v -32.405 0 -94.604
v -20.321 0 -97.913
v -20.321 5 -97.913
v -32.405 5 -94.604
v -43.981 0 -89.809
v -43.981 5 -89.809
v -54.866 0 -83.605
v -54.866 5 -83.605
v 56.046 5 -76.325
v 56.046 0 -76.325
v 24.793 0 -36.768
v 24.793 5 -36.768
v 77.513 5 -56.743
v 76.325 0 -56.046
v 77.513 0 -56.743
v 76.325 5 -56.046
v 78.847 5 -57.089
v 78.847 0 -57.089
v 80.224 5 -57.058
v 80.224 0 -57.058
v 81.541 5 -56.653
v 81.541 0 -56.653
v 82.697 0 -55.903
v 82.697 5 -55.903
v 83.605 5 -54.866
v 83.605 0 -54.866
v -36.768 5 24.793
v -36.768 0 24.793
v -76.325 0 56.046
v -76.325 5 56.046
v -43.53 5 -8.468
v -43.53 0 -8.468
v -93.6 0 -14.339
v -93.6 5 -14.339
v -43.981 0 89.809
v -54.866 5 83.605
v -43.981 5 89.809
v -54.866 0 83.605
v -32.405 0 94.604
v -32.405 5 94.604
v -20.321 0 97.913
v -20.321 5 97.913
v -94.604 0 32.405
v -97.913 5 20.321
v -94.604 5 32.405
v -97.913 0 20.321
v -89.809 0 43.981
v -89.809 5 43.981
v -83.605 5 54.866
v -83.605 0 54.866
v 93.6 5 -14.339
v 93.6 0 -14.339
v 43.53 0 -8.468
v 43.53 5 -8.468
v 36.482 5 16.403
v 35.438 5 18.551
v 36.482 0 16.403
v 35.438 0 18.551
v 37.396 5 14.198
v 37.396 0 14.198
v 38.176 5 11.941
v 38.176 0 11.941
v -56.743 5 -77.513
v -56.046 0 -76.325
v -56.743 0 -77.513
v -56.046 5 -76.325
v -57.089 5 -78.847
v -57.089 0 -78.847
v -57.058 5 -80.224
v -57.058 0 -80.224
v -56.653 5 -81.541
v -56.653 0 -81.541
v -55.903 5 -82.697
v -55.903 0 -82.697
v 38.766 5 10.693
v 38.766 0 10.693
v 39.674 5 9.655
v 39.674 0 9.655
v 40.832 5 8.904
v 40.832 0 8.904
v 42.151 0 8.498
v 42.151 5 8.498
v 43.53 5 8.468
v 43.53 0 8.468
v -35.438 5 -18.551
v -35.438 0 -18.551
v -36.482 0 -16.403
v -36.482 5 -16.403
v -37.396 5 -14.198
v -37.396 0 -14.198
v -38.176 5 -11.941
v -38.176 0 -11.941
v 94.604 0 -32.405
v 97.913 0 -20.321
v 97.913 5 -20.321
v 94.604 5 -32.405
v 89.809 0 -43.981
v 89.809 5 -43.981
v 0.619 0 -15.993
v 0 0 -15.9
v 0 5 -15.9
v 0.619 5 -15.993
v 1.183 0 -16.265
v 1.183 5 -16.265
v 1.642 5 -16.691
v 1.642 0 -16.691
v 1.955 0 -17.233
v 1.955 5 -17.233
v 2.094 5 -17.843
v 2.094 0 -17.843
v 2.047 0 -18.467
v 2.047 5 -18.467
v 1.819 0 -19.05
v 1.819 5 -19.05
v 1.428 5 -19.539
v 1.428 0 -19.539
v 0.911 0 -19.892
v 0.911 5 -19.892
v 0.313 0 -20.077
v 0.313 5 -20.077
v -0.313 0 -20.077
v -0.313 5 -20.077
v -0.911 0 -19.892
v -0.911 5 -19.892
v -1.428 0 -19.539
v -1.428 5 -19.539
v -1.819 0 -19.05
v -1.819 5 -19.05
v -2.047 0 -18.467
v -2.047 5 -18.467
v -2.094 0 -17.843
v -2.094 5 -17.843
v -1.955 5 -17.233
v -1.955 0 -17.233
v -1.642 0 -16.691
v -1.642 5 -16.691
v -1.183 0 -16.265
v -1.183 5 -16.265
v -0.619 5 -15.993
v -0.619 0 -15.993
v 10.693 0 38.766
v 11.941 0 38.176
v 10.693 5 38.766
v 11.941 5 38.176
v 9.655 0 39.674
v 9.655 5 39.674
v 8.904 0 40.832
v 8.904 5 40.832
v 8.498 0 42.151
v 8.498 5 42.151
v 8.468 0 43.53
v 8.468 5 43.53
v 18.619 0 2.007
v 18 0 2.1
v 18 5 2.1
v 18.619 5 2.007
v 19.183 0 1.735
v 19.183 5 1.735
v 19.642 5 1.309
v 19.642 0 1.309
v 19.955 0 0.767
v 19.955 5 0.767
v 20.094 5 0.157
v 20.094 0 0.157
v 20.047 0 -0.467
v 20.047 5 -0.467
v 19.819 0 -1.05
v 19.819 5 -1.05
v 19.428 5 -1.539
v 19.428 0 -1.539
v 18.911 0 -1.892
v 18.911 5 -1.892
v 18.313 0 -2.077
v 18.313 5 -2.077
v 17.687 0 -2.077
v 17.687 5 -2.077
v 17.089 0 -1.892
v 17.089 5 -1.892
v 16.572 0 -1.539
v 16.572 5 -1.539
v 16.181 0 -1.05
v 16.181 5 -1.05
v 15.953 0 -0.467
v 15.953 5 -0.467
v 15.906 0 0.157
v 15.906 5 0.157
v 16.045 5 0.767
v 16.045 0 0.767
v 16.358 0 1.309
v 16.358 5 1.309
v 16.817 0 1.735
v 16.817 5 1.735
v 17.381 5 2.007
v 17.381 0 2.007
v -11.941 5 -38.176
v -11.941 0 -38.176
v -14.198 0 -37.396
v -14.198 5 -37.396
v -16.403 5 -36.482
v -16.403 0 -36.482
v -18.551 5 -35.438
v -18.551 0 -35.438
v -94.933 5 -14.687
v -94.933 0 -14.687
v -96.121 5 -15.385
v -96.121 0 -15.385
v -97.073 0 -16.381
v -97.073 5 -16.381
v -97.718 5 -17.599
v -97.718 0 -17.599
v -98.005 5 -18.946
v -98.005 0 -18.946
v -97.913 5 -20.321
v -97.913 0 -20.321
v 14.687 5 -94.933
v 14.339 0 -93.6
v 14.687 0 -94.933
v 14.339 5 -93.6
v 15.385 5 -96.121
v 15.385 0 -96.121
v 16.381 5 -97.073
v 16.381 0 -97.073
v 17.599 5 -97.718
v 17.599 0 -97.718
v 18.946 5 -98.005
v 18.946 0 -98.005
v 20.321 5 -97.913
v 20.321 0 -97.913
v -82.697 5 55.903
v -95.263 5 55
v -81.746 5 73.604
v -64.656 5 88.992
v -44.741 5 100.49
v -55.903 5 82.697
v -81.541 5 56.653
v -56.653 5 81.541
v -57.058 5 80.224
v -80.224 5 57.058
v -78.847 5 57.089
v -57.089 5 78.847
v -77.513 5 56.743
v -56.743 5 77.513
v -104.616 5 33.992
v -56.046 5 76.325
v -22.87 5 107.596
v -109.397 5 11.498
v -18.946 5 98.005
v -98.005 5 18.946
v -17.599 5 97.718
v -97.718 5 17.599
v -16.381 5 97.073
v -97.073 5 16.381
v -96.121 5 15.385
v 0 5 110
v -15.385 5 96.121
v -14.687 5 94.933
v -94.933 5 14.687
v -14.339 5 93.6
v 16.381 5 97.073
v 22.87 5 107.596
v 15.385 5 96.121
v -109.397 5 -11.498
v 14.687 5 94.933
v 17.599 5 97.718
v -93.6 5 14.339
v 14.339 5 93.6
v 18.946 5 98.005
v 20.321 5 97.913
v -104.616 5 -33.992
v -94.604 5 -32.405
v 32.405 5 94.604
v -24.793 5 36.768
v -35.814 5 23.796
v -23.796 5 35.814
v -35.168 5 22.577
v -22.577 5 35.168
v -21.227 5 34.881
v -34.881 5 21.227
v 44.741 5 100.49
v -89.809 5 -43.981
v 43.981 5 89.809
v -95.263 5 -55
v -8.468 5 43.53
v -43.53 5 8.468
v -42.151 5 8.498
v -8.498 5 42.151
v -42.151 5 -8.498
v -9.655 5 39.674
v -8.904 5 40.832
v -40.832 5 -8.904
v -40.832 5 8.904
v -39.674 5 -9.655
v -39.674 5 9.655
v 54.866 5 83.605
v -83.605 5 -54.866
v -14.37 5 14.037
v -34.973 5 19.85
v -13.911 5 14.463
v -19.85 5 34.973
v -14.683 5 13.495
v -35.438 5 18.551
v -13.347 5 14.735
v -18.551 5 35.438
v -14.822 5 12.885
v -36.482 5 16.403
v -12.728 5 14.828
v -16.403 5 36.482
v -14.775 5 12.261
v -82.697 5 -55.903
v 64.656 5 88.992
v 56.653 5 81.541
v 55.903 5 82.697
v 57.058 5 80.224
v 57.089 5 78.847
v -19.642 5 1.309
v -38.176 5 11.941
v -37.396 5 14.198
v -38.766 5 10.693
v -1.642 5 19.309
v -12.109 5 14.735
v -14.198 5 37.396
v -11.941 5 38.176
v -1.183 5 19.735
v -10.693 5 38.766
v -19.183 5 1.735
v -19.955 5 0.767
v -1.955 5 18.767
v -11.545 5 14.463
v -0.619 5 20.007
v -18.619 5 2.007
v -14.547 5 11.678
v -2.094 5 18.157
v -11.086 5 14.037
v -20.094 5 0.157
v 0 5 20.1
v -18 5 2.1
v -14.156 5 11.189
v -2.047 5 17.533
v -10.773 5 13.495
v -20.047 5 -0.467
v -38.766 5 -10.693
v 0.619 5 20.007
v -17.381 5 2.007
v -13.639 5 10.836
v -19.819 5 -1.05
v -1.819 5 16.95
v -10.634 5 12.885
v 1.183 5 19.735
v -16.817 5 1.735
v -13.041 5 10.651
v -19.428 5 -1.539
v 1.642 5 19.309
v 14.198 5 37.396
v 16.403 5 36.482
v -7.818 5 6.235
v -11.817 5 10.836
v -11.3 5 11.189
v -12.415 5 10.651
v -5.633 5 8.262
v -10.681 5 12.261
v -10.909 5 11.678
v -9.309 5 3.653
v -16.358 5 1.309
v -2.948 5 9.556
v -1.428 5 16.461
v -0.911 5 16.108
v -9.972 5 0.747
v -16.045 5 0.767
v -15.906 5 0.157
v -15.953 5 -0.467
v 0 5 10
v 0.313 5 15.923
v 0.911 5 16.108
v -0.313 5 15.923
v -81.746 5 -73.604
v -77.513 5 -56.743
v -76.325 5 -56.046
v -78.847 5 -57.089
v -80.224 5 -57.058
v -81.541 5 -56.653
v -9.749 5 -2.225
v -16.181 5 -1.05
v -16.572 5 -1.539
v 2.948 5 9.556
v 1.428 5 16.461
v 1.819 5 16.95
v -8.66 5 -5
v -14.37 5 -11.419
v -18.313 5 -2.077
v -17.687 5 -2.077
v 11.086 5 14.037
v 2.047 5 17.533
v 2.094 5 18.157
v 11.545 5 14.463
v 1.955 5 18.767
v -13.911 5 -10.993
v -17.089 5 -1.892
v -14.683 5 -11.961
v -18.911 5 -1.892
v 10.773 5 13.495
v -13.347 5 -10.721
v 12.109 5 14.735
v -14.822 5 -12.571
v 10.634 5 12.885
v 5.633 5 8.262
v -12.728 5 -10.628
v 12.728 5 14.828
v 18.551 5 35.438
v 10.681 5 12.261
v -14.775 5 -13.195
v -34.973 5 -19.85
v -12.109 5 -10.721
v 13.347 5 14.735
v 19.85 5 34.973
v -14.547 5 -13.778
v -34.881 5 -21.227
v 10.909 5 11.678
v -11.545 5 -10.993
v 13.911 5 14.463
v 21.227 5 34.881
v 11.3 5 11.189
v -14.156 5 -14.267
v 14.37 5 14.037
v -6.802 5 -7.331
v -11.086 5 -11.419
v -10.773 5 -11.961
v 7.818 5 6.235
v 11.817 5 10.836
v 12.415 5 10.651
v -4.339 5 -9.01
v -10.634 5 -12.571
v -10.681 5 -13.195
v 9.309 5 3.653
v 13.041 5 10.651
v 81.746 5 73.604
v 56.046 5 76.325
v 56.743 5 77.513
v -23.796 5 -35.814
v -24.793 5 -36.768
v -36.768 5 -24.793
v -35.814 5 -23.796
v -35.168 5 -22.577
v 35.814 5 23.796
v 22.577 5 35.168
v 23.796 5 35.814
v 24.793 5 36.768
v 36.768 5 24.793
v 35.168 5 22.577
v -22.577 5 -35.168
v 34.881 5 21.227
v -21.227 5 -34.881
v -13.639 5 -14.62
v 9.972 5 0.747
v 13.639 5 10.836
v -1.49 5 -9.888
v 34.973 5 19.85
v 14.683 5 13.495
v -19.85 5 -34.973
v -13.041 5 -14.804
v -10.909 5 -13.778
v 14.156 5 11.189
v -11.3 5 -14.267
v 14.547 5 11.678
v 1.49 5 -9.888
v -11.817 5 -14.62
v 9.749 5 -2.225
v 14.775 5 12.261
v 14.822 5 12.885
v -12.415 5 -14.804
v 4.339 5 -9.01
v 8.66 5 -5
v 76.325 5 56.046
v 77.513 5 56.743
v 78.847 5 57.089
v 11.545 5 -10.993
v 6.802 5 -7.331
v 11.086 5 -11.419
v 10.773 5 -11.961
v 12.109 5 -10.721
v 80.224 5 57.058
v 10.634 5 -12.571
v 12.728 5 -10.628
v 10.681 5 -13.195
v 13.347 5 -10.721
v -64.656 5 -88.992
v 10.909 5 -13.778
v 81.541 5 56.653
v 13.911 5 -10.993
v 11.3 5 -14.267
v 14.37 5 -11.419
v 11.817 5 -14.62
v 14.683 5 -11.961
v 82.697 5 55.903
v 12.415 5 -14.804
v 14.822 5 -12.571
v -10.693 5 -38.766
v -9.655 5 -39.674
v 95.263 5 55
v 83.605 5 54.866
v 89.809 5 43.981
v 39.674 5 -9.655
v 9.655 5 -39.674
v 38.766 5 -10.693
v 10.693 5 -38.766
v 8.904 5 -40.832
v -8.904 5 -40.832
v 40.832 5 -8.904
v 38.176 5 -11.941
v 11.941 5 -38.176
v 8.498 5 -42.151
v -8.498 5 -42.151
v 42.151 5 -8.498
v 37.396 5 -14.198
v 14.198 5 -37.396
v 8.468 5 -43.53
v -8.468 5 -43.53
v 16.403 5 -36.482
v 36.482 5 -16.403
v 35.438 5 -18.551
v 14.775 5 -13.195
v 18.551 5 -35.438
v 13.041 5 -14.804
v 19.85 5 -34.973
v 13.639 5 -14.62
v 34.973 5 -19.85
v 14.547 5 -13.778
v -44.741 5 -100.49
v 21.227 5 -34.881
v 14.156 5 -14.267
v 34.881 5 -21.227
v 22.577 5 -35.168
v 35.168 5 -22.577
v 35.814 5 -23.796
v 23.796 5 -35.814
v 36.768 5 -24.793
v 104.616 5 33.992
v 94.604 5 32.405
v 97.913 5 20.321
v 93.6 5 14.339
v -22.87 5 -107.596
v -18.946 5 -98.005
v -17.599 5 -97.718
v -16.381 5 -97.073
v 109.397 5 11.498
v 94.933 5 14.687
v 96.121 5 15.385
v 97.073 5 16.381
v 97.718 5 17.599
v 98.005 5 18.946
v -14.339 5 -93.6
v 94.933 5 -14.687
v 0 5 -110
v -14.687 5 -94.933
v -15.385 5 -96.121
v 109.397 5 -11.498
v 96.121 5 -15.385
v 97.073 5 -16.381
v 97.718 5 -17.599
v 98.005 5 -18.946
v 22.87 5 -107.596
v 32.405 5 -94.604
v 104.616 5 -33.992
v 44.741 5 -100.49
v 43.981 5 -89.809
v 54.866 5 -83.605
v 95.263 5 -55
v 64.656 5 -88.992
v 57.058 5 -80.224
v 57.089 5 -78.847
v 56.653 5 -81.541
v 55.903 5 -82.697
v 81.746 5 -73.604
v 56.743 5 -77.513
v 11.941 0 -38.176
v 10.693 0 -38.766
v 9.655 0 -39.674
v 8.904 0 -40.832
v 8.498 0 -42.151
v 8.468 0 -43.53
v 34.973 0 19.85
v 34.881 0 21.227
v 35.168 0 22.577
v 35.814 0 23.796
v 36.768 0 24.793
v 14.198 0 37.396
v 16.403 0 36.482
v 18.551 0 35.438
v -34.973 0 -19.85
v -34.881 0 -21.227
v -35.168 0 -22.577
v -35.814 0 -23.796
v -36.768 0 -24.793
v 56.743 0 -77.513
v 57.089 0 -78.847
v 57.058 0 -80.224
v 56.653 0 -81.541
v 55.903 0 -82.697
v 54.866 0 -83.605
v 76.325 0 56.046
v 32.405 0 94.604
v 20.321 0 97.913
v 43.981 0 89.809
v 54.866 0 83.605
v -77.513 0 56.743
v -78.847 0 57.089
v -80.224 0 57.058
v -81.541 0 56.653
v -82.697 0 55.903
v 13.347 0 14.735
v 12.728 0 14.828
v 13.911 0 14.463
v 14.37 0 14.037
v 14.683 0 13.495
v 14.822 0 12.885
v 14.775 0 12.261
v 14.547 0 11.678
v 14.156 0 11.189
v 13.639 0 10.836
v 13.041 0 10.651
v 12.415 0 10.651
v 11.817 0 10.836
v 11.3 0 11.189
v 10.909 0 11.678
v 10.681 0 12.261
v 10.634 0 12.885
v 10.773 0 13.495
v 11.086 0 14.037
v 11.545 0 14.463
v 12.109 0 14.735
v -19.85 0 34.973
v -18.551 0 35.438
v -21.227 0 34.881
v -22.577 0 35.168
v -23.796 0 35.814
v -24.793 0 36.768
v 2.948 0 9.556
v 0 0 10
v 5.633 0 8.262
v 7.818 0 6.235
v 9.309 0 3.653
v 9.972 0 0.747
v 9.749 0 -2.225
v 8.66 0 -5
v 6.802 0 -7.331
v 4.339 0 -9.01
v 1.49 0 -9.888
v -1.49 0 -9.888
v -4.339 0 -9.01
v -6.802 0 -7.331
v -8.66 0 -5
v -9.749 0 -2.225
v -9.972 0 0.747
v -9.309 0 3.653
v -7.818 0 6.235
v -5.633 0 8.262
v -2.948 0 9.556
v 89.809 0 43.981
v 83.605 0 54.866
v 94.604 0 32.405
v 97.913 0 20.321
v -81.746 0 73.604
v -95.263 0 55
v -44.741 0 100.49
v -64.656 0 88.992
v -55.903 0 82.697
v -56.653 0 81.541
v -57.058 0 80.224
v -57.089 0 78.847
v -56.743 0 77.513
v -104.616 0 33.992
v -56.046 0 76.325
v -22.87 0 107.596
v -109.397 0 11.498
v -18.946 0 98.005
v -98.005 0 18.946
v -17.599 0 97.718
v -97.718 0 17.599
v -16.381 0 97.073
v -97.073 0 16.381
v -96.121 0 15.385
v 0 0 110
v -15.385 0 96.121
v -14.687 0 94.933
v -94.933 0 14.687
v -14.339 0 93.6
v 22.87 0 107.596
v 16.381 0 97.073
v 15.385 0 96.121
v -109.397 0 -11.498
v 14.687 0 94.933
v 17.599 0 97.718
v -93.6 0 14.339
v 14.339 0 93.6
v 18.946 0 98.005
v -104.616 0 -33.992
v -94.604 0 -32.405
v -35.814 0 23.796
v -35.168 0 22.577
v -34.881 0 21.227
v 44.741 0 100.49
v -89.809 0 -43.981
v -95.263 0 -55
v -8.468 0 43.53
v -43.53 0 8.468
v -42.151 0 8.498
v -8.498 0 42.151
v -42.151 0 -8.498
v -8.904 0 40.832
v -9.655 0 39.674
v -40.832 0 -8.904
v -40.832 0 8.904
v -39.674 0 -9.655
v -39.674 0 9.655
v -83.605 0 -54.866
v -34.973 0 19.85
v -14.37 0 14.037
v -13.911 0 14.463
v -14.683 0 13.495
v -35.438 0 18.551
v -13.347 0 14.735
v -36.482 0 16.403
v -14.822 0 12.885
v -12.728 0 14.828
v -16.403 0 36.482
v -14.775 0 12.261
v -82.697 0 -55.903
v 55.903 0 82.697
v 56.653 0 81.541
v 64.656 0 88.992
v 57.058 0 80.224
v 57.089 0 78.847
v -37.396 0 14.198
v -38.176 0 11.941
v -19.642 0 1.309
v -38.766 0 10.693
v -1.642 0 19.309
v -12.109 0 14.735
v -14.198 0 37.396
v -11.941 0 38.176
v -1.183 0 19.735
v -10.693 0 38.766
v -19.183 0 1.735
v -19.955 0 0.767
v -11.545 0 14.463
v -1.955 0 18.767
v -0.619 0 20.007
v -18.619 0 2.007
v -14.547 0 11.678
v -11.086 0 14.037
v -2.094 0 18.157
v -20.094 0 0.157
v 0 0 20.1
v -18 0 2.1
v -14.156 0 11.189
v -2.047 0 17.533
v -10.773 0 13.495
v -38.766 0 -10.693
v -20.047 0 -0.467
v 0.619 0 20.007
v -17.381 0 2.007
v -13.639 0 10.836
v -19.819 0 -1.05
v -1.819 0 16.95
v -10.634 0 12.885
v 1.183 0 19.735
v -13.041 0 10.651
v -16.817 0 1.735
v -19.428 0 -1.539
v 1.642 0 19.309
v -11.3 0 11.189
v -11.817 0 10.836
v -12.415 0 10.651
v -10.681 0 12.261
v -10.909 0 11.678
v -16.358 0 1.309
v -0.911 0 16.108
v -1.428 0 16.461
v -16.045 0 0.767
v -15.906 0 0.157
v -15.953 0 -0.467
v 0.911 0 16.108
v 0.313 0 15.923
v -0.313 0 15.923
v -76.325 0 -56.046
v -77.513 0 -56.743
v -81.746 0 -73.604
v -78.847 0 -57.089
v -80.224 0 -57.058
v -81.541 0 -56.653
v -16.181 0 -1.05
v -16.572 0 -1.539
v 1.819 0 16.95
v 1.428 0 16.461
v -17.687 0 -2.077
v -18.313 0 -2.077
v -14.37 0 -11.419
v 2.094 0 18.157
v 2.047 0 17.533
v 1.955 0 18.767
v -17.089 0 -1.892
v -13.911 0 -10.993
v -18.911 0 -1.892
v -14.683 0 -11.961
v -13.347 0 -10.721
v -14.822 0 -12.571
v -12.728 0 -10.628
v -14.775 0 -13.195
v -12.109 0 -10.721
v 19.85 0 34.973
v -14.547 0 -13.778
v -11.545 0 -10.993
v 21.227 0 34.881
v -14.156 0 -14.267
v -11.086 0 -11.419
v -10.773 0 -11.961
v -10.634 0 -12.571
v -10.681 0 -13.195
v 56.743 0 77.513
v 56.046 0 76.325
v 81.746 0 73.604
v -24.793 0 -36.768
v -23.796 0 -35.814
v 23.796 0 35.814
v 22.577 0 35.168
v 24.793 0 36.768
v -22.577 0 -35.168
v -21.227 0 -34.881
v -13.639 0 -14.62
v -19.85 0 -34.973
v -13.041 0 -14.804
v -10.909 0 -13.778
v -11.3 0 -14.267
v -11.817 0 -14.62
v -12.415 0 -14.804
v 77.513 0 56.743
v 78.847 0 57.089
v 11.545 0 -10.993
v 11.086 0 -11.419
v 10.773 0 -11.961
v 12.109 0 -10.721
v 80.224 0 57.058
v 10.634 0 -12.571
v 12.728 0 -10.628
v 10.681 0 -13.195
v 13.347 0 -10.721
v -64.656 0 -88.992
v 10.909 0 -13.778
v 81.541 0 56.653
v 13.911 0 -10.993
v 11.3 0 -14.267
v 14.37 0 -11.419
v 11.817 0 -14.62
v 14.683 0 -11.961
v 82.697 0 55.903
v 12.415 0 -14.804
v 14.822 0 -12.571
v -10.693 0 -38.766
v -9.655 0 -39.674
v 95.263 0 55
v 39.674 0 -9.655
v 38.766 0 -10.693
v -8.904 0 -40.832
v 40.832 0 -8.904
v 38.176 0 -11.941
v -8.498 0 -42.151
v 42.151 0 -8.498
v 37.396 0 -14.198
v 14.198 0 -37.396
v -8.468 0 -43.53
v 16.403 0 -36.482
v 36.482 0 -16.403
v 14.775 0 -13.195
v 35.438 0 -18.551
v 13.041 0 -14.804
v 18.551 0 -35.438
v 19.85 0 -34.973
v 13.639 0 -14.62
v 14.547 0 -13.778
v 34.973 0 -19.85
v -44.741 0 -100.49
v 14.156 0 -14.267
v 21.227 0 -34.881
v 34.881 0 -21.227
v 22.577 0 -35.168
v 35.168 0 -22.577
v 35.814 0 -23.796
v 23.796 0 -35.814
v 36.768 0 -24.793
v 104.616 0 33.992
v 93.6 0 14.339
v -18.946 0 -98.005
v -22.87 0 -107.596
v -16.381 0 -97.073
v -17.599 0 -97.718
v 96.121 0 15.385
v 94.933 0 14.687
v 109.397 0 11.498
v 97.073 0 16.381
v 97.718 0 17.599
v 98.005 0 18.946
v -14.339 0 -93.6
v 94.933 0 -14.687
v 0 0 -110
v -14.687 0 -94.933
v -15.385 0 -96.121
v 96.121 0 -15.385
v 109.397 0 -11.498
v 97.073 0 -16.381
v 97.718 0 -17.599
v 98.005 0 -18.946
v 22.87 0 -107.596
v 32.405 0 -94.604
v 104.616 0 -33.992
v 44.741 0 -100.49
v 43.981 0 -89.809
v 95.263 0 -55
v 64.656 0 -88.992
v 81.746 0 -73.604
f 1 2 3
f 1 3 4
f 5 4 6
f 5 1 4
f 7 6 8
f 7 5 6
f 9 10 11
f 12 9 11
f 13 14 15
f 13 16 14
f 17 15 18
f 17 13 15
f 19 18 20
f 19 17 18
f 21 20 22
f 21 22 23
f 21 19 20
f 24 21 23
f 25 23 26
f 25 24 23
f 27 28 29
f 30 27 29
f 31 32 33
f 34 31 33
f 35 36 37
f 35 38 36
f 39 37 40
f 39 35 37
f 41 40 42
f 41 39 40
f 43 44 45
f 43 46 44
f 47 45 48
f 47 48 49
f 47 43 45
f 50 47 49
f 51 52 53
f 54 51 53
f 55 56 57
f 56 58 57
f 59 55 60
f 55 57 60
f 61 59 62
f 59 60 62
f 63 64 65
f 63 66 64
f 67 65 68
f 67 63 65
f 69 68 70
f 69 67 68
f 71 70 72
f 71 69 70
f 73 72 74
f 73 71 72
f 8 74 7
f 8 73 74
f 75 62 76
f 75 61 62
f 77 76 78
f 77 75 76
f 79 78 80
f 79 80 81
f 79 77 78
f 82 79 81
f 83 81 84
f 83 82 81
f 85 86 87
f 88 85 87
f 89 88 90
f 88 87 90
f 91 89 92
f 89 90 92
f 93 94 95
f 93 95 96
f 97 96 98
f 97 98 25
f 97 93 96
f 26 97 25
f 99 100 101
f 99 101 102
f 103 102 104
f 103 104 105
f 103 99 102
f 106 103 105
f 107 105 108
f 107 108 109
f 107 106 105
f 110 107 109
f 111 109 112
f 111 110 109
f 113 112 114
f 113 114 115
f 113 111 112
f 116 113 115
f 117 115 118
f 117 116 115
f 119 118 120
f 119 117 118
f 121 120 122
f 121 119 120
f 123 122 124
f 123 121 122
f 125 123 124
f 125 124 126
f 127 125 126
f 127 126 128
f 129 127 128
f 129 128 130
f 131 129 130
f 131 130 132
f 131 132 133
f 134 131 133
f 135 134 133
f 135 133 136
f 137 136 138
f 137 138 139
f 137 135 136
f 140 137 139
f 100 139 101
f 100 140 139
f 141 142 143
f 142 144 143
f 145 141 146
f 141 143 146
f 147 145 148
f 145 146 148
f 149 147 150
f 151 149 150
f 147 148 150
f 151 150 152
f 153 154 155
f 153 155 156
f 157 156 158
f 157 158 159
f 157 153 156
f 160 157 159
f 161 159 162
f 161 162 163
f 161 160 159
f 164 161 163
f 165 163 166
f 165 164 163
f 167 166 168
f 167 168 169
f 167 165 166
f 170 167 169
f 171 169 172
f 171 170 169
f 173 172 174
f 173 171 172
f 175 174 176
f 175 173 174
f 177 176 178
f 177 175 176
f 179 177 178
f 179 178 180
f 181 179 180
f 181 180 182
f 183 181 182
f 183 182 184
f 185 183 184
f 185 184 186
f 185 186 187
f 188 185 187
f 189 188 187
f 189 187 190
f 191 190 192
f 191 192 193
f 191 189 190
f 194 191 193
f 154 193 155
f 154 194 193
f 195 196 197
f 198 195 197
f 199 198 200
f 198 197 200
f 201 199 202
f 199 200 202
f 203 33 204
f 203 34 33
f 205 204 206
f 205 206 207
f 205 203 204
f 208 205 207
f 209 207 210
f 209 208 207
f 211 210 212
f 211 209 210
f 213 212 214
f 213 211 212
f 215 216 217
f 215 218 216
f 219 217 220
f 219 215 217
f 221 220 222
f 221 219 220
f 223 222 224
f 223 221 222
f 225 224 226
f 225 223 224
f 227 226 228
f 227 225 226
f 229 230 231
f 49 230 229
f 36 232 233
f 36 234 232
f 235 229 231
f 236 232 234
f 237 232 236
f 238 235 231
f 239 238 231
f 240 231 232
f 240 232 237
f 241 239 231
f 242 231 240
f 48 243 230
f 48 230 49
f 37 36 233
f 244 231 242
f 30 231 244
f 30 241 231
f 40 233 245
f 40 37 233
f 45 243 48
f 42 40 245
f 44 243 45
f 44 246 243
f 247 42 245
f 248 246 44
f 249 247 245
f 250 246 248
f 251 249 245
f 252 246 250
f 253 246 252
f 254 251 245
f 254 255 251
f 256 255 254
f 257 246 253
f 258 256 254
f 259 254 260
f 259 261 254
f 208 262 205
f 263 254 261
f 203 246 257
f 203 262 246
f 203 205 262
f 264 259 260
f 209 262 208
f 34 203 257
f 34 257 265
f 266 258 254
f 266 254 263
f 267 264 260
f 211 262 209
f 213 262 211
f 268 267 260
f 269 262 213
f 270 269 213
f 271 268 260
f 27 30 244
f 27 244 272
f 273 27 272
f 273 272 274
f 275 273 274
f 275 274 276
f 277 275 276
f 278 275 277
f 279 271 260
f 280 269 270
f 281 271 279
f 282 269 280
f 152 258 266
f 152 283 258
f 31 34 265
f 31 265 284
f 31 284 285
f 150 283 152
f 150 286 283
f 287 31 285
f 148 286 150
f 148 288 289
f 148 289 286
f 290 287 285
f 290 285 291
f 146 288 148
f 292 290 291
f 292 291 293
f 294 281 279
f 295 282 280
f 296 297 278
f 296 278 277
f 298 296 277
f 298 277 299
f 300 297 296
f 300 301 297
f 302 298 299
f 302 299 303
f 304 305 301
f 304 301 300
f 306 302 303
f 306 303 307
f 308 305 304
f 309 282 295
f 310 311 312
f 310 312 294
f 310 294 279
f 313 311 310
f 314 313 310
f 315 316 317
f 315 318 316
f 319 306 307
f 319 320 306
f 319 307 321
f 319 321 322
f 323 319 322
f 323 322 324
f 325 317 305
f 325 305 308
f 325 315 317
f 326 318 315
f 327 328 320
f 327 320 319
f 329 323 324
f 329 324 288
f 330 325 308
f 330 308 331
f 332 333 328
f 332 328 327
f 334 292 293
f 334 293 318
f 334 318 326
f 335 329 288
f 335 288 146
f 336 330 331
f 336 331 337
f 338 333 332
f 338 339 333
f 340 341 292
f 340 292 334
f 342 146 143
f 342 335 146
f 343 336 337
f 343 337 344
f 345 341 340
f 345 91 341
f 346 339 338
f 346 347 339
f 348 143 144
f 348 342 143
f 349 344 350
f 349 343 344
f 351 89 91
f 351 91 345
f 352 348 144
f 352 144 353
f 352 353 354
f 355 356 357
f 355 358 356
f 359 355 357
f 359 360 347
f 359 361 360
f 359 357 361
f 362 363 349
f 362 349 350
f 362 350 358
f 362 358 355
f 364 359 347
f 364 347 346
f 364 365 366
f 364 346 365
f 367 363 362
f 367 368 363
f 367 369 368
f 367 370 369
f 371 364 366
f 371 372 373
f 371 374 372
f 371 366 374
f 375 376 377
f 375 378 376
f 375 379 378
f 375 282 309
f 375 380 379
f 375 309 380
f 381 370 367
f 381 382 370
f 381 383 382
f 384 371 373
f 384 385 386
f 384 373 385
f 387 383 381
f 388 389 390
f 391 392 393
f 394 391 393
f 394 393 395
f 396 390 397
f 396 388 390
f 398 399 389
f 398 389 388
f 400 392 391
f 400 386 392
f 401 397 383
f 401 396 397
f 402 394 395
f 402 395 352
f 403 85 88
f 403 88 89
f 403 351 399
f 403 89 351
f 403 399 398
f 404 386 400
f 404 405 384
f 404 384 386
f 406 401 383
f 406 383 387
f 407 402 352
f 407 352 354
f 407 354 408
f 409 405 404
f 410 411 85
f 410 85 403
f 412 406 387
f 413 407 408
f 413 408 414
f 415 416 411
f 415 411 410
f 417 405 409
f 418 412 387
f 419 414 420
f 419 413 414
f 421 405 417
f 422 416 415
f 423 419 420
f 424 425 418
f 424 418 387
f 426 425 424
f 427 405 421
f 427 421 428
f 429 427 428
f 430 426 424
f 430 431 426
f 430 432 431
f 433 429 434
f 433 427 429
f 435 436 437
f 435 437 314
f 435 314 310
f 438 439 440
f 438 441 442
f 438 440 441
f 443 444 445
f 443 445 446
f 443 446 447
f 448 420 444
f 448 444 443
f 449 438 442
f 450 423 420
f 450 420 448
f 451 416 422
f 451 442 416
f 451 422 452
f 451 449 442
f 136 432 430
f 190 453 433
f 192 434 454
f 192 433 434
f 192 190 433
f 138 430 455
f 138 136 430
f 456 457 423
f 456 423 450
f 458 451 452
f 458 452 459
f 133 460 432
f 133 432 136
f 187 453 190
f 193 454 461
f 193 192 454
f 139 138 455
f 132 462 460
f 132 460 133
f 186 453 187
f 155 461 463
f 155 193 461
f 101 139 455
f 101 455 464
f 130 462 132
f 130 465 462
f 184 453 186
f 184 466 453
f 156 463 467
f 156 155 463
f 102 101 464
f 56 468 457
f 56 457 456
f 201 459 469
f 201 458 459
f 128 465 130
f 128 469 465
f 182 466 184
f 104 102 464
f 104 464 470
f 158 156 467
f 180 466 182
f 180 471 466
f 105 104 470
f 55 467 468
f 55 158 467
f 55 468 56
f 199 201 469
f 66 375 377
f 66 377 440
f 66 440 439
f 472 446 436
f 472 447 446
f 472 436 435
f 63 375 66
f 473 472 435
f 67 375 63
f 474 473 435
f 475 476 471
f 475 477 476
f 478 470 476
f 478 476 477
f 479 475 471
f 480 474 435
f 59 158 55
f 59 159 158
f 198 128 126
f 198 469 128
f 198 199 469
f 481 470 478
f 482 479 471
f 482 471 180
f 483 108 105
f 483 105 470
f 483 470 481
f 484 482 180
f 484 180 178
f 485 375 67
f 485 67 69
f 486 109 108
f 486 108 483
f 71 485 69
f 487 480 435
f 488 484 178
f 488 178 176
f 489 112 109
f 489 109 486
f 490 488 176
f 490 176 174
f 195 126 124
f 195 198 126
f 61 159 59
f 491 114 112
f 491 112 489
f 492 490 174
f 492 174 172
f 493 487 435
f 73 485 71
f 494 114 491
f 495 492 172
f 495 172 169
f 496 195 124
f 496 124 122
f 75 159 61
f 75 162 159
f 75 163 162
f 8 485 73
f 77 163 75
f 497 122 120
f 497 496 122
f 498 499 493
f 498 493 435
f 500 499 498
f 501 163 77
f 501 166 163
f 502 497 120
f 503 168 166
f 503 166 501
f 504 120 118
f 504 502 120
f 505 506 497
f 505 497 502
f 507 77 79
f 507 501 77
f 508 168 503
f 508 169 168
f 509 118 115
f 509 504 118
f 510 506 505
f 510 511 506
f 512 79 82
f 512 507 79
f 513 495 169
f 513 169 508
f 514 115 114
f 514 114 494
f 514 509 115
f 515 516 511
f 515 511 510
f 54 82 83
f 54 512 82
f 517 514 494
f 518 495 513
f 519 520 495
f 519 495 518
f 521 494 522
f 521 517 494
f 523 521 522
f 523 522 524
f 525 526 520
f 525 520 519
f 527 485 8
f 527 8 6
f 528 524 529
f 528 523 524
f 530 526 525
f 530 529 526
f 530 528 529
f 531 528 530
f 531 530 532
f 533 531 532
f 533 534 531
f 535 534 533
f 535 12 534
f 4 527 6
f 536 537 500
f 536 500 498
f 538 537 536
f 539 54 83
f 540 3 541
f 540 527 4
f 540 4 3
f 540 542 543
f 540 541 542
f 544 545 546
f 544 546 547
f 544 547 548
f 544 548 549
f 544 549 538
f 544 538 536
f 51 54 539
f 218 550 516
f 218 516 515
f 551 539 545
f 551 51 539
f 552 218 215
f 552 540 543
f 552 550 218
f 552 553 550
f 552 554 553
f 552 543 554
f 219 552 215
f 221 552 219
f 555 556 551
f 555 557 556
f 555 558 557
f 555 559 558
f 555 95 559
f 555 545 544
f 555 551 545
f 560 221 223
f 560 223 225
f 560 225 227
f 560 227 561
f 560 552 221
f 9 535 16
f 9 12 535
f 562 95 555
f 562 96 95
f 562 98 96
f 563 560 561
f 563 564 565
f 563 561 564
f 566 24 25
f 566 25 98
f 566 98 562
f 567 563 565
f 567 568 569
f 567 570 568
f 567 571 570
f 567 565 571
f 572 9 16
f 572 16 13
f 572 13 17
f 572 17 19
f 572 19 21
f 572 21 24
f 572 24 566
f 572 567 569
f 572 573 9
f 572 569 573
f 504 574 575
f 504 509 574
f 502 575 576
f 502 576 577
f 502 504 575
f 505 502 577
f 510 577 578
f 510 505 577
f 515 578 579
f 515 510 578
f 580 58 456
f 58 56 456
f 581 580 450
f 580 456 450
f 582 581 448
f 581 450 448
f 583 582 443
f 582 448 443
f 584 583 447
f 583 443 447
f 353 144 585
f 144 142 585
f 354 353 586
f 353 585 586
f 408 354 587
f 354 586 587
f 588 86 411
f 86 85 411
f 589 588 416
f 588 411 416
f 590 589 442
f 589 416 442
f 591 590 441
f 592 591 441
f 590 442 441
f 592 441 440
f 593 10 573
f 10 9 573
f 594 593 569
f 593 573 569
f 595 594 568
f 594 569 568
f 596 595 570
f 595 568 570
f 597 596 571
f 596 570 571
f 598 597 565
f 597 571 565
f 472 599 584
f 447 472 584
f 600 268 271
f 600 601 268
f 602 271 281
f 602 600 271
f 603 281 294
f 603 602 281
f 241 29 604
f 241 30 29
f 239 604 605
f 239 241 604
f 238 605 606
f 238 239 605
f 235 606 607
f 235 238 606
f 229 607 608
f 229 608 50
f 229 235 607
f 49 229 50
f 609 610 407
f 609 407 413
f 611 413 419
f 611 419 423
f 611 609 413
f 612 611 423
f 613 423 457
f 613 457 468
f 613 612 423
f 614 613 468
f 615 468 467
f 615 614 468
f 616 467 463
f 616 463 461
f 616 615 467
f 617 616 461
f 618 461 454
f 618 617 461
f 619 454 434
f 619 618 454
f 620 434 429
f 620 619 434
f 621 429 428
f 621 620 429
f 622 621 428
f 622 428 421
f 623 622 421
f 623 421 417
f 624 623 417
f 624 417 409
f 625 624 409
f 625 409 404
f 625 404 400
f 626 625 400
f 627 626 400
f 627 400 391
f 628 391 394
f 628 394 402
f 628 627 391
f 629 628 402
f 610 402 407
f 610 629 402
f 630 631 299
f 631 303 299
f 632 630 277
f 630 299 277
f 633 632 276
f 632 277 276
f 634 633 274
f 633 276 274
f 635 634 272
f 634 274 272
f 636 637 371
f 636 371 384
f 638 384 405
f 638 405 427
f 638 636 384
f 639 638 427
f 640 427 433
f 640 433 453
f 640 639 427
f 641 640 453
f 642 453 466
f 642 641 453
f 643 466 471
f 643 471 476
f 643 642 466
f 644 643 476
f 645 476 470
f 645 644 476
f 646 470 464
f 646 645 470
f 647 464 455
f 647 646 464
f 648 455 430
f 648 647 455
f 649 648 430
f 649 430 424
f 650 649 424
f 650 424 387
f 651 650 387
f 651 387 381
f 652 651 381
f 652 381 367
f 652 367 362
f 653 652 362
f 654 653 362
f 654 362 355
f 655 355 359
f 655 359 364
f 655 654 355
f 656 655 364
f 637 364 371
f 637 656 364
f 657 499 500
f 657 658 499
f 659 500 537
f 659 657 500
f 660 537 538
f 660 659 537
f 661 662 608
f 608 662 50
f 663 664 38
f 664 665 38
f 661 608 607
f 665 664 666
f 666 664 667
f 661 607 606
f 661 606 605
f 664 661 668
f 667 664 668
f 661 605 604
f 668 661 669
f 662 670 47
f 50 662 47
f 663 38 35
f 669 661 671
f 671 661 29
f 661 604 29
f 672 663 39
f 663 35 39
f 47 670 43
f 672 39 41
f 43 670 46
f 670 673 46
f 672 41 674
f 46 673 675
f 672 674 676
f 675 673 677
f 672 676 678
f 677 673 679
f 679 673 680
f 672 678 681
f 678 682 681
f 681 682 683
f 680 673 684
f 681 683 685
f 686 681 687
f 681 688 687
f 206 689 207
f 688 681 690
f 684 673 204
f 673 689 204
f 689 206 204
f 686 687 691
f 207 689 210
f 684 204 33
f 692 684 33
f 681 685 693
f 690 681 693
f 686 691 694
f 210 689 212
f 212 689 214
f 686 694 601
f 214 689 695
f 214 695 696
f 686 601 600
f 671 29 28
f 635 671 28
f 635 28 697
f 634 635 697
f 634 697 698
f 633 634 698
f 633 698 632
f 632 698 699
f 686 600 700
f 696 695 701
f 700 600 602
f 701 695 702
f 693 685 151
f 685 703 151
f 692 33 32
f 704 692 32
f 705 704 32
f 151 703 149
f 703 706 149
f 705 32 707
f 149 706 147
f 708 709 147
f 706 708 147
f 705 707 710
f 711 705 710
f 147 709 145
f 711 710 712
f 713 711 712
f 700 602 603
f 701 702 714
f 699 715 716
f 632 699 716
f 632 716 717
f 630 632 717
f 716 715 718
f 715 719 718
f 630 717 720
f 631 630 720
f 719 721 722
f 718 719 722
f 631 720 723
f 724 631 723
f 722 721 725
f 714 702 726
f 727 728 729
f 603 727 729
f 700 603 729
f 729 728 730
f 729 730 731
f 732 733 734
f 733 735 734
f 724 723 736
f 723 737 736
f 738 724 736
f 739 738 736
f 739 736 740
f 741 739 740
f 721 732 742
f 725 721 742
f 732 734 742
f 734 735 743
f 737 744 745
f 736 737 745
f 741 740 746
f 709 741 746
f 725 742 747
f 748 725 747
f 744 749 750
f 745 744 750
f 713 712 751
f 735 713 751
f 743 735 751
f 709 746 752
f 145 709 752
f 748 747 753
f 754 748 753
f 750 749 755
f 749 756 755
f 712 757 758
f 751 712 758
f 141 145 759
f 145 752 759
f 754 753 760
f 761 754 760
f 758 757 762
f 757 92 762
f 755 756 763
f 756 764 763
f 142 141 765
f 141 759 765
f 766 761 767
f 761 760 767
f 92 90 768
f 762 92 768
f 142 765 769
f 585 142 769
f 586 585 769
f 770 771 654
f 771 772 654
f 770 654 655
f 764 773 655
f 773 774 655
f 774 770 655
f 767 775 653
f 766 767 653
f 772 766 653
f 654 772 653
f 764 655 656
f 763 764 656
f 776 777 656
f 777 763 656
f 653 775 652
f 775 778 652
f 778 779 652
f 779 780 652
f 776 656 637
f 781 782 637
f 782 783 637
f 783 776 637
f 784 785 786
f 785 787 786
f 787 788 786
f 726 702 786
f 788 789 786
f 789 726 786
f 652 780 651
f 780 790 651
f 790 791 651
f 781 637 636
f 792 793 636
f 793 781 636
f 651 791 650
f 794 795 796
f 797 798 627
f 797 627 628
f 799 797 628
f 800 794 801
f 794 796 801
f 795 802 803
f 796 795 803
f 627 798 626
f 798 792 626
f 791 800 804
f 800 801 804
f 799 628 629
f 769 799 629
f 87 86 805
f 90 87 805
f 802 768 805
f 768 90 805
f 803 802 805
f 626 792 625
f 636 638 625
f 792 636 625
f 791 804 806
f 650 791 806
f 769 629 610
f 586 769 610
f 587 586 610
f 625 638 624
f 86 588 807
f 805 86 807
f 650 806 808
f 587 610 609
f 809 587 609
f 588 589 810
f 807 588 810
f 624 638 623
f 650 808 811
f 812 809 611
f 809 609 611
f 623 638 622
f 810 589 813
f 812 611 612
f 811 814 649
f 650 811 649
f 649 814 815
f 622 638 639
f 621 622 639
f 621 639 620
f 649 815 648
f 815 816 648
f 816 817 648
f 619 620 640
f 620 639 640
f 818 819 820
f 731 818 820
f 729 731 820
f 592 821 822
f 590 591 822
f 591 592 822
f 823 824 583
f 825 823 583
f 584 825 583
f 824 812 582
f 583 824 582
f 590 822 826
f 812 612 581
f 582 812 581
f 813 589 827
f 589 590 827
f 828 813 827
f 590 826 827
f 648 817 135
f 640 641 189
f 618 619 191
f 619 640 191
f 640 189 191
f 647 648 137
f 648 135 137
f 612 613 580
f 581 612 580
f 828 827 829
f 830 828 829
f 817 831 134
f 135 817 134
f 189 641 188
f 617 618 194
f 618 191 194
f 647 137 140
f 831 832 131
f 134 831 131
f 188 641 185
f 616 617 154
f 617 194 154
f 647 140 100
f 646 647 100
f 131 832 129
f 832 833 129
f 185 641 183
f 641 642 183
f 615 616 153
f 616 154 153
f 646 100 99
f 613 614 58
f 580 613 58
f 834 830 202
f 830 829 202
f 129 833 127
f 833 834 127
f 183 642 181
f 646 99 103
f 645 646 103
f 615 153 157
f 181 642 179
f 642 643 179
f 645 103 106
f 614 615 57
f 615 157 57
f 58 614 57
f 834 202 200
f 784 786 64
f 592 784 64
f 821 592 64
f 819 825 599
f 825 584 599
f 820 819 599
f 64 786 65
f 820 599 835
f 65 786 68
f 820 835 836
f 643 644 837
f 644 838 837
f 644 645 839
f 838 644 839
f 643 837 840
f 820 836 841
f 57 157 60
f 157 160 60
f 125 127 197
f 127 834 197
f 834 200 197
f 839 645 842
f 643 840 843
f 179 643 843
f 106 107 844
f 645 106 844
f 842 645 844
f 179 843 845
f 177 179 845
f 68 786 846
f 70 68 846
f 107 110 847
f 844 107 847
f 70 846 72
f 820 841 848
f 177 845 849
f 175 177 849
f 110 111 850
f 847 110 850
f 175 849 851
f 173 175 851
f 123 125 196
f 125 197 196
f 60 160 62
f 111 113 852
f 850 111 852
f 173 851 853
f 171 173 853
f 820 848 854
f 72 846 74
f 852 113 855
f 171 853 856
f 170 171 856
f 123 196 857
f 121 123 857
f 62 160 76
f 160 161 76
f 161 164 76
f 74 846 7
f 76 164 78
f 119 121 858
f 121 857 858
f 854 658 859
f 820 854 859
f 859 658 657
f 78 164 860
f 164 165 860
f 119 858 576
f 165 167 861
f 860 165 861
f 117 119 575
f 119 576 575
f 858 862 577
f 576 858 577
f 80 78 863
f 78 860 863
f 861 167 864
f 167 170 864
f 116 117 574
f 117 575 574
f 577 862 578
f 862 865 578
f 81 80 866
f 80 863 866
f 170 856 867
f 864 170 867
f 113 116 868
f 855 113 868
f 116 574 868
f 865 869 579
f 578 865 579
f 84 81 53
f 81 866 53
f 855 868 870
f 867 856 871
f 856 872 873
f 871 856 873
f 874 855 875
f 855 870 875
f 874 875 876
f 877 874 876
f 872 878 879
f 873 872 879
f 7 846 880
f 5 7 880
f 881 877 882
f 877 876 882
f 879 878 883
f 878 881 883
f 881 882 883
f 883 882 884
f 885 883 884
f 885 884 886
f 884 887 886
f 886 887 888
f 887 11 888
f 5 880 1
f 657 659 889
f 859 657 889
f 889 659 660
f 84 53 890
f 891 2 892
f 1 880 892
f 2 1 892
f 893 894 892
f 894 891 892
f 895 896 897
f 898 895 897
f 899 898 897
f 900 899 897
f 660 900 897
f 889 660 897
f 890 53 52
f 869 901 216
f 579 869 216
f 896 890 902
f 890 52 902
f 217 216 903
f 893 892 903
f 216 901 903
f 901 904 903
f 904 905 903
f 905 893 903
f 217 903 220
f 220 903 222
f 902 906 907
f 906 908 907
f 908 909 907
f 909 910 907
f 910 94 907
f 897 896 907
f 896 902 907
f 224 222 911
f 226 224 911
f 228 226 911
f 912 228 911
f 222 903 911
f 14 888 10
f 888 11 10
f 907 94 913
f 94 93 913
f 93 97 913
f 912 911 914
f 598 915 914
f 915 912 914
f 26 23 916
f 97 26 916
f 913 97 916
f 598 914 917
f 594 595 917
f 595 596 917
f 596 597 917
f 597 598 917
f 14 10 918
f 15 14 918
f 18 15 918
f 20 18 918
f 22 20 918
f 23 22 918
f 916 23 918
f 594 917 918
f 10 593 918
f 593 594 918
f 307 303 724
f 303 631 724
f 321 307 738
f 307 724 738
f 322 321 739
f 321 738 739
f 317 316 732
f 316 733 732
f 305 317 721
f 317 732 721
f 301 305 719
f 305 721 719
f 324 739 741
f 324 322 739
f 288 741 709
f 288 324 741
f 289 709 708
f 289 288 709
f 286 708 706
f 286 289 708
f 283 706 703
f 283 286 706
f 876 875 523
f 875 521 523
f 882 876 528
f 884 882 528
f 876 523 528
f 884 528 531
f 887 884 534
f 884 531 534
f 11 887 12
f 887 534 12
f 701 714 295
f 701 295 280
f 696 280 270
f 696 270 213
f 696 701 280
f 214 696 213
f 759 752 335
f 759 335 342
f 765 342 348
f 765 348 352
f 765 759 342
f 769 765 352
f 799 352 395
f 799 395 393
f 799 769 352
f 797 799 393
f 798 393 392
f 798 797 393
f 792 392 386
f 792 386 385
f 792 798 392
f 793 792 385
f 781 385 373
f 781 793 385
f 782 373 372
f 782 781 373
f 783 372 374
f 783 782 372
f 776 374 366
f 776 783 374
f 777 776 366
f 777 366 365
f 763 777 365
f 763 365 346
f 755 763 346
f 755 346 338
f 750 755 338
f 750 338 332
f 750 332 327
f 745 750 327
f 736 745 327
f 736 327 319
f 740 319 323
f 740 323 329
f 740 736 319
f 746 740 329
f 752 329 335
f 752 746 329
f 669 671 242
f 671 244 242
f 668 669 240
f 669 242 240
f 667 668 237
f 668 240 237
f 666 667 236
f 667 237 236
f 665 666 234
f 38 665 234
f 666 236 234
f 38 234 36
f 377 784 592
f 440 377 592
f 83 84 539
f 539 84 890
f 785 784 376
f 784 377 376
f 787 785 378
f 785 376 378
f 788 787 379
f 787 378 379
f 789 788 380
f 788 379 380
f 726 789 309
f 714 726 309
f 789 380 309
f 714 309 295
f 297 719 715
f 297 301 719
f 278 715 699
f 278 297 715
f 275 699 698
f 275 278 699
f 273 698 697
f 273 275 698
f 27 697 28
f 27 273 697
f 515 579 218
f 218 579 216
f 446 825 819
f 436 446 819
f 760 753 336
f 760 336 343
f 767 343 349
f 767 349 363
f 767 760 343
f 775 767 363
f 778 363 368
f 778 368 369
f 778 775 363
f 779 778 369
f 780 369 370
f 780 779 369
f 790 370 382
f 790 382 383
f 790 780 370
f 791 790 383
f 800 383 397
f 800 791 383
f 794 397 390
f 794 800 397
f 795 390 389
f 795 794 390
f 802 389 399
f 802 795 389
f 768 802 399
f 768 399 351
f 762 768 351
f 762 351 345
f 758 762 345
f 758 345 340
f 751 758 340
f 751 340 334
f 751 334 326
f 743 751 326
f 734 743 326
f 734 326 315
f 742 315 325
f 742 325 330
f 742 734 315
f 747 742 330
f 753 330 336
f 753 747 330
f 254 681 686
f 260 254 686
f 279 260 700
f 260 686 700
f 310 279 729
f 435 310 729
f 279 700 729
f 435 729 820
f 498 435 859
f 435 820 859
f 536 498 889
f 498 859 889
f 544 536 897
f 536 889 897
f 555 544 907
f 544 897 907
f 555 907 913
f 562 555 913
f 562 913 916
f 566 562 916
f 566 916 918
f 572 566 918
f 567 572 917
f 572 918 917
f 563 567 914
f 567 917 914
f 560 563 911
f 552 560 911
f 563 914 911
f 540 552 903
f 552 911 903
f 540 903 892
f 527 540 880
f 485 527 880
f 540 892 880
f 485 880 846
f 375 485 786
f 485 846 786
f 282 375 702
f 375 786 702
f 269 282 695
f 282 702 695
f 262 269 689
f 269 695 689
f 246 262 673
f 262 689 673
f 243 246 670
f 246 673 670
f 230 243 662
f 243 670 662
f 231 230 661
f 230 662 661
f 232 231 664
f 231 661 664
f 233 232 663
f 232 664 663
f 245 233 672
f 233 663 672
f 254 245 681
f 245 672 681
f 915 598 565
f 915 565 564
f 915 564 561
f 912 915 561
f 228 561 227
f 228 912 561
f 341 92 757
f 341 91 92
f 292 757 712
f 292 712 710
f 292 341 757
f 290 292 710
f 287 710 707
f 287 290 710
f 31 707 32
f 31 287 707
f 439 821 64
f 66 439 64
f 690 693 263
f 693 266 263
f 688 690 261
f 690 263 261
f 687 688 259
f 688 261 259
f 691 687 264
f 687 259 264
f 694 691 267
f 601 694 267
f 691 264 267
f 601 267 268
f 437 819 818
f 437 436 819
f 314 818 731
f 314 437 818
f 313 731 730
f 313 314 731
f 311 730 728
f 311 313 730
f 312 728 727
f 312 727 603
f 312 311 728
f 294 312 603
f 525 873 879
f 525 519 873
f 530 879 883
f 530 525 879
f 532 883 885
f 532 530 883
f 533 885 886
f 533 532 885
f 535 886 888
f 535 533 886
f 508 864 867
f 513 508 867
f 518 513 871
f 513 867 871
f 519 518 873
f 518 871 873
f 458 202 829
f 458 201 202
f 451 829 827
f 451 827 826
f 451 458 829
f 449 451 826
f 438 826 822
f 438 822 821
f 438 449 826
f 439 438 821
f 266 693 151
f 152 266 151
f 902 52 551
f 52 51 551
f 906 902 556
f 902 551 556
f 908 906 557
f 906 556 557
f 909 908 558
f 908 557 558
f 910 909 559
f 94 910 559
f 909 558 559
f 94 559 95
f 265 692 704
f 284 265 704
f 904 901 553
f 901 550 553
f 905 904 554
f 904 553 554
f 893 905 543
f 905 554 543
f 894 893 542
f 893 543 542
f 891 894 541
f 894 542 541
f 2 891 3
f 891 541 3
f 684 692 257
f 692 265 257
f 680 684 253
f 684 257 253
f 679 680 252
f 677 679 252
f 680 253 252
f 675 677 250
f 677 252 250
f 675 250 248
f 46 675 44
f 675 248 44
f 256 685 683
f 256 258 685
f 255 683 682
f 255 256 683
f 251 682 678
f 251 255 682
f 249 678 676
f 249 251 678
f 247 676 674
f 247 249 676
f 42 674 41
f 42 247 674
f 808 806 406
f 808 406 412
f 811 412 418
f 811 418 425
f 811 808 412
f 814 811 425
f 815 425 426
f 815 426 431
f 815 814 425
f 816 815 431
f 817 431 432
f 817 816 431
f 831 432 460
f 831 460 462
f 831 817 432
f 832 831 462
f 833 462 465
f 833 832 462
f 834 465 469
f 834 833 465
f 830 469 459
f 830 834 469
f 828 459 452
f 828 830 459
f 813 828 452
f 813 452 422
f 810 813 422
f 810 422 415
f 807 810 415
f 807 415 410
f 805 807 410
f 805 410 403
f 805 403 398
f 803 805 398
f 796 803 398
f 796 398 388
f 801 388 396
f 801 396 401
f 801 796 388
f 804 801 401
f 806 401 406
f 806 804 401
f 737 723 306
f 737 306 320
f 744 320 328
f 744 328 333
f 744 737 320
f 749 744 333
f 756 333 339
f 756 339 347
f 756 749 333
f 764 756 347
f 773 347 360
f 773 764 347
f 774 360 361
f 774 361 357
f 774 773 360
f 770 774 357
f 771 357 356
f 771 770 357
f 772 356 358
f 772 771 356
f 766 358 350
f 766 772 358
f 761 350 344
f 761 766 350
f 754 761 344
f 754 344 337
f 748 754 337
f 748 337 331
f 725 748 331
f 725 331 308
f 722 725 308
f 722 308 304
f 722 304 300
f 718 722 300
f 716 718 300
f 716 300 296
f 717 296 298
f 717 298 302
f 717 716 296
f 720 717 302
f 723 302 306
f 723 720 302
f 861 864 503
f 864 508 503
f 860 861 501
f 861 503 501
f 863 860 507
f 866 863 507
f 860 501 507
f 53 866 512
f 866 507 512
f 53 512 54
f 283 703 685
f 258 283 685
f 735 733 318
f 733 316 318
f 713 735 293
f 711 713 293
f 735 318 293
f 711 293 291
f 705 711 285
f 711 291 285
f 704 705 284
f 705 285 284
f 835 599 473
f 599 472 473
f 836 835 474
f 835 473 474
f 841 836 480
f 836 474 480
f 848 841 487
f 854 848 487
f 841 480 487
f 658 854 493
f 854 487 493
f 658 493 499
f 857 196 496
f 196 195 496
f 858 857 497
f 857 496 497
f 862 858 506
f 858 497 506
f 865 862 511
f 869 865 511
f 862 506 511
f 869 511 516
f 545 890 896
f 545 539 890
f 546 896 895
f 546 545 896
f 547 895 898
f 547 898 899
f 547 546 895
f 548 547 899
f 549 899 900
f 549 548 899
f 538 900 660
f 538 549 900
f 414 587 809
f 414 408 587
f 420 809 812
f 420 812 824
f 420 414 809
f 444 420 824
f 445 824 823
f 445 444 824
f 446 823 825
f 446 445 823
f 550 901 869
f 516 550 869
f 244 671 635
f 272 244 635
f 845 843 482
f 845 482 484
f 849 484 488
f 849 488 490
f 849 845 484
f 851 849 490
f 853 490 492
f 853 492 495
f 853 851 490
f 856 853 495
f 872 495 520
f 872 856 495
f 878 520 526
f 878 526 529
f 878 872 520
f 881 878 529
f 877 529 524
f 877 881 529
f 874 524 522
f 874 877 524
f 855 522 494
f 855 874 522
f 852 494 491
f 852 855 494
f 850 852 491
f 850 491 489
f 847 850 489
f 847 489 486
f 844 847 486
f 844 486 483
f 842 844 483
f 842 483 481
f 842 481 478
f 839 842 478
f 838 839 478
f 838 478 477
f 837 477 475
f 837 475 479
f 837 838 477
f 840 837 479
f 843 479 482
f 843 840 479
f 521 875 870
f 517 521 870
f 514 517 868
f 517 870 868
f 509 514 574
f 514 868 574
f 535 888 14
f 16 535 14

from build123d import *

# Parameters (mm, degrees)
SKETCH_1_R      = 110
SKETCH_1_R_2    = 100
SKETCH_1_R_3    = 40
SKETCH_1_R_4    = 25
SKETCH_1_R_5    = 2.1
SKETCH_1_R_6    = 10
EXTRUDE_3_DEPTH = 5
FILLET_2_R      = 5


with BuildPart() as part:
    # Эскиз1 → Бобышка-Вытянуть3 (new body)
    # profile 1 of 11: a face of its own
    with BuildSketch(Plane(origin=(0, 0, 0), x_dir=(1, 0, 0), z_dir=(0, 1, 0))):
        with Locations(Location((0, 0, 0), (0, 0, 270))):
            Circle(SKETCH_1_R)
        Circle(SKETCH_1_R_2, mode=Mode.SUBTRACT)
    # profile 2 of 11: a face of its own
    with BuildSketch(Plane(origin=(0, 0, 0), x_dir=(1, 0, 0), z_dir=(0, 1, 0))):
        with BuildLine():
            ThreePointArc((-98.875, 14.957753006), (-100, 0), (-98.875, -14.957753006))
            Line((-98.875, -14.957753006), (-39.2, -7.959899497))
            ThreePointArc((-39.2, -7.959899497), (-40, 0), (-39.2, 7.959899497))
            Line((-39.2, 7.959899497), (-98.875, 14.957753006))
        make_face()
    # profile 3 of 11: a face of its own
    with BuildSketch(Plane(origin=(0, 0, 0), x_dir=(1, 0, 0), z_dir=(0, 1, 0))):
        with BuildLine():
            ThreePointArc((-59.338454408, 80.491911572), (-70.710678119, 70.710678119), (-80.491911572, 59.338454408))
            Line((-80.491911572, 59.338454408), (-33.347084734, 22.090086911))
            ThreePointArc((-33.347084734, 22.090086911), (-28.284271247, 28.284271247), (-22.090086911, 33.347084734))
            Line((-22.090086911, 33.347084734), (-59.338454408, 80.491911572))
        make_face()
    # profile 4 of 11: a face of its own
    with BuildSketch(Plane(origin=(0, 0, 0), x_dir=(1, 0, 0), z_dir=(0, 1, 0))):
        with BuildLine():
            ThreePointArc((14.957753006, 98.875), (0, 100), (-14.957753006, 98.875))
            Line((-14.957753006, 98.875), (-7.959899497, 39.2))
            ThreePointArc((-7.959899497, 39.2), (0, 40), (7.959899497, 39.2))
            Line((7.959899497, 39.2), (14.957753006, 98.875))
        make_face()
    # profile 5 of 11: a face of its own
    with BuildSketch(Plane(origin=(0, 0, 0), x_dir=(1, 0, 0), z_dir=(0, 1, 0))):
        with BuildLine():
            Line((33.347084734, 22.090086911), (80.491911572, 59.338454408))
            ThreePointArc((80.491911572, 59.338454408), (70.710678119, 70.710678119), (59.338454408, 80.491911572))
            Line((59.338454408, 80.491911572), (22.090086911, 33.347084734))
            ThreePointArc((22.090086911, 33.347084734), (28.284271247, 28.284271247), (33.347084734, 22.090086911))
        make_face()
    # profile 6 of 11: a face of its own
    with BuildSketch(Plane(origin=(0, 0, 0), x_dir=(1, 0, 0), z_dir=(0, 1, 0))):
        with BuildLine():
            Line((39.2, -7.959899497), (98.875, -14.957753006))
            ThreePointArc((98.875, -14.957753006), (99.718353376, -7.5), (100, 0))
            ThreePointArc((100, 0), (99.718353376, 7.5), (98.875, 14.957753006))
            Line((98.875, 14.957753006), (39.2, 7.959899497))
            ThreePointArc((39.2, 7.959899497), (39.799497484, 4), (40, 0))
            ThreePointArc((40, 0), (39.799497484, -4), (39.2, -7.959899497))
        make_face()
    # profile 7 of 11: a face of its own
    with BuildSketch(Plane(origin=(0, 0, 0), x_dir=(1, 0, 0), z_dir=(0, 1, 0))):
        with BuildLine():
            Line((22.090086911, -33.347084734), (59.338454408, -80.491911572))
            ThreePointArc((59.338454408, -80.491911572), (70.710678119, -70.710678119), (80.491911572, -59.338454408))
            Line((80.491911572, -59.338454408), (33.347084734, -22.090086911))
            ThreePointArc((33.347084734, -22.090086911), (28.284271247, -28.284271247), (22.090086911, -33.347084734))
        make_face()
    # profile 8 of 11: a face of its own
    with BuildSketch(Plane(origin=(0, 0, 0), x_dir=(1, 0, 0), z_dir=(0, 1, 0))):
        with BuildLine():
            Line((-7.959899497, -39.2), (-14.957753006, -98.875))
            ThreePointArc((-14.957753006, -98.875), (0, -100), (14.957753006, -98.875))
            Line((14.957753006, -98.875), (7.959899497, -39.2))
            ThreePointArc((7.959899497, -39.2), (0, -40), (-7.959899497, -39.2))
        make_face()
    # profile 9 of 11: a face of its own
    with BuildSketch(Plane(origin=(0, 0, 0), x_dir=(1, 0, 0), z_dir=(0, 1, 0))):
        with BuildLine():
            ThreePointArc((-80.491911572, -59.338454408), (-70.710678119, -70.710678119), (-59.338454408, -80.491911572))
            Line((-59.338454408, -80.491911572), (-22.090086911, -33.347084734))
            ThreePointArc((-22.090086911, -33.347084734), (-28.284271247, -28.284271247), (-33.347084734, -22.090086911))
            Line((-33.347084734, -22.090086911), (-80.491911572, -59.338454408))
        make_face()
    # profile 10 of 11: a face of its own
    with BuildSketch(Plane(origin=(0, 0, 0), x_dir=(1, 0, 0), z_dir=(0, 1, 0))):
        Circle(SKETCH_1_R_3)
        Circle(SKETCH_1_R_4, mode=Mode.SUBTRACT)
    # profile 11 of 11: a face of its own
    with BuildSketch(Plane(origin=(0, 0, 0), x_dir=(1, 0, 0), z_dir=(0, 1, 0))):
        Circle(SKETCH_1_R_4)
        with Locations(Location((-12.727922061, 12.727922061, 0), (0, 0, 270))):
            Circle(SKETCH_1_R_5, mode=Mode.SUBTRACT)
        with Locations(Location((12.727922061, 12.727922061, 0), (0, 0, 270))):
            Circle(SKETCH_1_R_5, mode=Mode.SUBTRACT)
        with Locations(Location((18, 0, 0), (0, 0, 270))):
            Circle(SKETCH_1_R_5, mode=Mode.SUBTRACT)
        with Locations(Location((-12.727922061, -12.727922061, 0), (0, 0, 270))):
            Circle(SKETCH_1_R_5, mode=Mode.SUBTRACT)
        with Locations(Location((0, -18, 0), (0, 0, 270))):
            Circle(SKETCH_1_R_5, mode=Mode.SUBTRACT)
        with Locations(Location((-18, 0, 0), (0, 0, 270))):
            Circle(SKETCH_1_R_5, mode=Mode.SUBTRACT)
        with Locations(Location((12.727922061, -12.727922061, 0), (0, 0, 270))):
            Circle(SKETCH_1_R_5, mode=Mode.SUBTRACT)
        with Locations(Location((0, 18, 0), (0, 0, 270))):
            Circle(SKETCH_1_R_5, mode=Mode.SUBTRACT)
        with Locations(Location((0, 0, 0), (0, 0, 270))):
            Circle(SKETCH_1_R_6, mode=Mode.SUBTRACT)
    extrude(amount=EXTRUDE_3_DEPTH)

    # Скругление2
    fillet_2_edges = [part.edges().sort_by_distance(p)[0] for p in [
        (59.338454408, 2.5, 80.491911572),
        (22.090086911, 2.5, 33.347084734),
        (7.959899497, 2.5, 39.2),
        (14.957753006, 2.5, 98.875),
        (80.491911572, 2.5, 59.338454408),
        (98.875, 2.5, 14.957753006),
        (39.2, 2.5, 7.959899497),
        (33.347084734, 2.5, 22.090086911),
        (98.875, 2.5, -14.957753006),
        (80.491911572, 2.5, -59.338454408),
        (33.347084734, 2.5, -22.090086911),
        (39.2, 2.5, -7.959899497),
        (59.338454408, 2.5, -80.491911572),
        (14.957753006, 2.5, -98.875),
        (7.959899497, 2.5, -39.2),
        (22.090086911, 2.5, -33.347084734),
        (-14.957753006, 2.5, -98.875),
        (-59.338454408, 2.5, -80.491911572),
        (-22.090086911, 2.5, -33.347084734),
        (-7.959899497, 2.5, -39.2),
        (-80.491911572, 2.5, -59.338454408),
        (-98.875, 2.5, -14.957753006),
        (-39.2, 2.5, -7.959899497),
        (-33.347084734, 2.5, -22.090086911),
        (-98.875, 2.5, 14.957753006),
        (-80.491911572, 2.5, 59.338454408),
        (-33.347084734, 2.5, 22.090086911),
        (-39.2, 2.5, 7.959899497),
        (-59.338454408, 2.5, 80.491911572),
        (-14.957753006, 2.5, 98.875),
        (-7.959899497, 2.5, 39.2),
        (-22.090086911, 2.5, 33.347084734),
    ]]
    fillet(fillet_2_edges, radius=FILLET_2_R)


solid = part.part
